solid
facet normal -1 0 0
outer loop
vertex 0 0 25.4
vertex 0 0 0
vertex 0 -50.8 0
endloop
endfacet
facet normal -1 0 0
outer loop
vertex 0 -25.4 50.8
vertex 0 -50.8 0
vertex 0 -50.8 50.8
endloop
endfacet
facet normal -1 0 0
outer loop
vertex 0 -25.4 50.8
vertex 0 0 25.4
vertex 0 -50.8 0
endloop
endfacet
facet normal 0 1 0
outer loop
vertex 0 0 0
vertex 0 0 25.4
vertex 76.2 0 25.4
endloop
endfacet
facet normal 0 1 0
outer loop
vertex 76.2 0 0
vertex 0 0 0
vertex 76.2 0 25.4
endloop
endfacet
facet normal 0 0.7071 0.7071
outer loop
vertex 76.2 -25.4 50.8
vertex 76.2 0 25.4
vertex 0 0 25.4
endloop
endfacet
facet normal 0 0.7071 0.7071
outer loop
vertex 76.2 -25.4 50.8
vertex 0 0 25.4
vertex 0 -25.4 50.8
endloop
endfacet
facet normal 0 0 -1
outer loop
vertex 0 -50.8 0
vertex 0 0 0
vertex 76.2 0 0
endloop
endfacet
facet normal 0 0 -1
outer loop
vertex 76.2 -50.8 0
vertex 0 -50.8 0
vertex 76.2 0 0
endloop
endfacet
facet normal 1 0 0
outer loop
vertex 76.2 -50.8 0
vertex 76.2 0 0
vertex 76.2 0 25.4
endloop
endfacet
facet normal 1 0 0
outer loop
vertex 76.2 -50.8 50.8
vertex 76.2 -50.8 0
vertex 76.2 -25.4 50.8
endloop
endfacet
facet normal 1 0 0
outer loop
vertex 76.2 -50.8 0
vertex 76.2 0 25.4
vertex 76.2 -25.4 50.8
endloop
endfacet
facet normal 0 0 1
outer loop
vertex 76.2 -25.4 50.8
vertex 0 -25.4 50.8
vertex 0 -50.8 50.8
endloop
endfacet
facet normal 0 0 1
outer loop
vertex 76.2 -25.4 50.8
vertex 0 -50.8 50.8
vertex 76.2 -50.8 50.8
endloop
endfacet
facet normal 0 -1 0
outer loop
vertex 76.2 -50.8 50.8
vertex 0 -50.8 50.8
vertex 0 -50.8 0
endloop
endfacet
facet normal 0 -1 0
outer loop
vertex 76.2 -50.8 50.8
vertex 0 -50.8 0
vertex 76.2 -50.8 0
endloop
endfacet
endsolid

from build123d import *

# Parameters (mm, degrees)
F0_W     = 76.2
F0_H     = 50.8
F1_DEPTH = 50.8
F3_DEPTH = 76.201


with BuildPart() as f1:
    # F0 (on Front) → F1 (new body)
    with BuildSketch(Plane.XZ):
        with Locations((38.1, 25.4)):
            Rectangle(F0_W, F0_H)
    extrude(amount=F1_DEPTH)

    # F2 (on face) → F3 (cut, through all)
    with BuildSketch(Plane(origin=(0, 0, 0), x_dir=(0, -1, 0), z_dir=(-1, 0, 0))):
        Polygon((0, 50.8), (0, 25.4), (25.4, 50.8), align=None)
    extrude(amount=-F3_DEPTH, mode=Mode.SUBTRACT)


solid = f1.part
